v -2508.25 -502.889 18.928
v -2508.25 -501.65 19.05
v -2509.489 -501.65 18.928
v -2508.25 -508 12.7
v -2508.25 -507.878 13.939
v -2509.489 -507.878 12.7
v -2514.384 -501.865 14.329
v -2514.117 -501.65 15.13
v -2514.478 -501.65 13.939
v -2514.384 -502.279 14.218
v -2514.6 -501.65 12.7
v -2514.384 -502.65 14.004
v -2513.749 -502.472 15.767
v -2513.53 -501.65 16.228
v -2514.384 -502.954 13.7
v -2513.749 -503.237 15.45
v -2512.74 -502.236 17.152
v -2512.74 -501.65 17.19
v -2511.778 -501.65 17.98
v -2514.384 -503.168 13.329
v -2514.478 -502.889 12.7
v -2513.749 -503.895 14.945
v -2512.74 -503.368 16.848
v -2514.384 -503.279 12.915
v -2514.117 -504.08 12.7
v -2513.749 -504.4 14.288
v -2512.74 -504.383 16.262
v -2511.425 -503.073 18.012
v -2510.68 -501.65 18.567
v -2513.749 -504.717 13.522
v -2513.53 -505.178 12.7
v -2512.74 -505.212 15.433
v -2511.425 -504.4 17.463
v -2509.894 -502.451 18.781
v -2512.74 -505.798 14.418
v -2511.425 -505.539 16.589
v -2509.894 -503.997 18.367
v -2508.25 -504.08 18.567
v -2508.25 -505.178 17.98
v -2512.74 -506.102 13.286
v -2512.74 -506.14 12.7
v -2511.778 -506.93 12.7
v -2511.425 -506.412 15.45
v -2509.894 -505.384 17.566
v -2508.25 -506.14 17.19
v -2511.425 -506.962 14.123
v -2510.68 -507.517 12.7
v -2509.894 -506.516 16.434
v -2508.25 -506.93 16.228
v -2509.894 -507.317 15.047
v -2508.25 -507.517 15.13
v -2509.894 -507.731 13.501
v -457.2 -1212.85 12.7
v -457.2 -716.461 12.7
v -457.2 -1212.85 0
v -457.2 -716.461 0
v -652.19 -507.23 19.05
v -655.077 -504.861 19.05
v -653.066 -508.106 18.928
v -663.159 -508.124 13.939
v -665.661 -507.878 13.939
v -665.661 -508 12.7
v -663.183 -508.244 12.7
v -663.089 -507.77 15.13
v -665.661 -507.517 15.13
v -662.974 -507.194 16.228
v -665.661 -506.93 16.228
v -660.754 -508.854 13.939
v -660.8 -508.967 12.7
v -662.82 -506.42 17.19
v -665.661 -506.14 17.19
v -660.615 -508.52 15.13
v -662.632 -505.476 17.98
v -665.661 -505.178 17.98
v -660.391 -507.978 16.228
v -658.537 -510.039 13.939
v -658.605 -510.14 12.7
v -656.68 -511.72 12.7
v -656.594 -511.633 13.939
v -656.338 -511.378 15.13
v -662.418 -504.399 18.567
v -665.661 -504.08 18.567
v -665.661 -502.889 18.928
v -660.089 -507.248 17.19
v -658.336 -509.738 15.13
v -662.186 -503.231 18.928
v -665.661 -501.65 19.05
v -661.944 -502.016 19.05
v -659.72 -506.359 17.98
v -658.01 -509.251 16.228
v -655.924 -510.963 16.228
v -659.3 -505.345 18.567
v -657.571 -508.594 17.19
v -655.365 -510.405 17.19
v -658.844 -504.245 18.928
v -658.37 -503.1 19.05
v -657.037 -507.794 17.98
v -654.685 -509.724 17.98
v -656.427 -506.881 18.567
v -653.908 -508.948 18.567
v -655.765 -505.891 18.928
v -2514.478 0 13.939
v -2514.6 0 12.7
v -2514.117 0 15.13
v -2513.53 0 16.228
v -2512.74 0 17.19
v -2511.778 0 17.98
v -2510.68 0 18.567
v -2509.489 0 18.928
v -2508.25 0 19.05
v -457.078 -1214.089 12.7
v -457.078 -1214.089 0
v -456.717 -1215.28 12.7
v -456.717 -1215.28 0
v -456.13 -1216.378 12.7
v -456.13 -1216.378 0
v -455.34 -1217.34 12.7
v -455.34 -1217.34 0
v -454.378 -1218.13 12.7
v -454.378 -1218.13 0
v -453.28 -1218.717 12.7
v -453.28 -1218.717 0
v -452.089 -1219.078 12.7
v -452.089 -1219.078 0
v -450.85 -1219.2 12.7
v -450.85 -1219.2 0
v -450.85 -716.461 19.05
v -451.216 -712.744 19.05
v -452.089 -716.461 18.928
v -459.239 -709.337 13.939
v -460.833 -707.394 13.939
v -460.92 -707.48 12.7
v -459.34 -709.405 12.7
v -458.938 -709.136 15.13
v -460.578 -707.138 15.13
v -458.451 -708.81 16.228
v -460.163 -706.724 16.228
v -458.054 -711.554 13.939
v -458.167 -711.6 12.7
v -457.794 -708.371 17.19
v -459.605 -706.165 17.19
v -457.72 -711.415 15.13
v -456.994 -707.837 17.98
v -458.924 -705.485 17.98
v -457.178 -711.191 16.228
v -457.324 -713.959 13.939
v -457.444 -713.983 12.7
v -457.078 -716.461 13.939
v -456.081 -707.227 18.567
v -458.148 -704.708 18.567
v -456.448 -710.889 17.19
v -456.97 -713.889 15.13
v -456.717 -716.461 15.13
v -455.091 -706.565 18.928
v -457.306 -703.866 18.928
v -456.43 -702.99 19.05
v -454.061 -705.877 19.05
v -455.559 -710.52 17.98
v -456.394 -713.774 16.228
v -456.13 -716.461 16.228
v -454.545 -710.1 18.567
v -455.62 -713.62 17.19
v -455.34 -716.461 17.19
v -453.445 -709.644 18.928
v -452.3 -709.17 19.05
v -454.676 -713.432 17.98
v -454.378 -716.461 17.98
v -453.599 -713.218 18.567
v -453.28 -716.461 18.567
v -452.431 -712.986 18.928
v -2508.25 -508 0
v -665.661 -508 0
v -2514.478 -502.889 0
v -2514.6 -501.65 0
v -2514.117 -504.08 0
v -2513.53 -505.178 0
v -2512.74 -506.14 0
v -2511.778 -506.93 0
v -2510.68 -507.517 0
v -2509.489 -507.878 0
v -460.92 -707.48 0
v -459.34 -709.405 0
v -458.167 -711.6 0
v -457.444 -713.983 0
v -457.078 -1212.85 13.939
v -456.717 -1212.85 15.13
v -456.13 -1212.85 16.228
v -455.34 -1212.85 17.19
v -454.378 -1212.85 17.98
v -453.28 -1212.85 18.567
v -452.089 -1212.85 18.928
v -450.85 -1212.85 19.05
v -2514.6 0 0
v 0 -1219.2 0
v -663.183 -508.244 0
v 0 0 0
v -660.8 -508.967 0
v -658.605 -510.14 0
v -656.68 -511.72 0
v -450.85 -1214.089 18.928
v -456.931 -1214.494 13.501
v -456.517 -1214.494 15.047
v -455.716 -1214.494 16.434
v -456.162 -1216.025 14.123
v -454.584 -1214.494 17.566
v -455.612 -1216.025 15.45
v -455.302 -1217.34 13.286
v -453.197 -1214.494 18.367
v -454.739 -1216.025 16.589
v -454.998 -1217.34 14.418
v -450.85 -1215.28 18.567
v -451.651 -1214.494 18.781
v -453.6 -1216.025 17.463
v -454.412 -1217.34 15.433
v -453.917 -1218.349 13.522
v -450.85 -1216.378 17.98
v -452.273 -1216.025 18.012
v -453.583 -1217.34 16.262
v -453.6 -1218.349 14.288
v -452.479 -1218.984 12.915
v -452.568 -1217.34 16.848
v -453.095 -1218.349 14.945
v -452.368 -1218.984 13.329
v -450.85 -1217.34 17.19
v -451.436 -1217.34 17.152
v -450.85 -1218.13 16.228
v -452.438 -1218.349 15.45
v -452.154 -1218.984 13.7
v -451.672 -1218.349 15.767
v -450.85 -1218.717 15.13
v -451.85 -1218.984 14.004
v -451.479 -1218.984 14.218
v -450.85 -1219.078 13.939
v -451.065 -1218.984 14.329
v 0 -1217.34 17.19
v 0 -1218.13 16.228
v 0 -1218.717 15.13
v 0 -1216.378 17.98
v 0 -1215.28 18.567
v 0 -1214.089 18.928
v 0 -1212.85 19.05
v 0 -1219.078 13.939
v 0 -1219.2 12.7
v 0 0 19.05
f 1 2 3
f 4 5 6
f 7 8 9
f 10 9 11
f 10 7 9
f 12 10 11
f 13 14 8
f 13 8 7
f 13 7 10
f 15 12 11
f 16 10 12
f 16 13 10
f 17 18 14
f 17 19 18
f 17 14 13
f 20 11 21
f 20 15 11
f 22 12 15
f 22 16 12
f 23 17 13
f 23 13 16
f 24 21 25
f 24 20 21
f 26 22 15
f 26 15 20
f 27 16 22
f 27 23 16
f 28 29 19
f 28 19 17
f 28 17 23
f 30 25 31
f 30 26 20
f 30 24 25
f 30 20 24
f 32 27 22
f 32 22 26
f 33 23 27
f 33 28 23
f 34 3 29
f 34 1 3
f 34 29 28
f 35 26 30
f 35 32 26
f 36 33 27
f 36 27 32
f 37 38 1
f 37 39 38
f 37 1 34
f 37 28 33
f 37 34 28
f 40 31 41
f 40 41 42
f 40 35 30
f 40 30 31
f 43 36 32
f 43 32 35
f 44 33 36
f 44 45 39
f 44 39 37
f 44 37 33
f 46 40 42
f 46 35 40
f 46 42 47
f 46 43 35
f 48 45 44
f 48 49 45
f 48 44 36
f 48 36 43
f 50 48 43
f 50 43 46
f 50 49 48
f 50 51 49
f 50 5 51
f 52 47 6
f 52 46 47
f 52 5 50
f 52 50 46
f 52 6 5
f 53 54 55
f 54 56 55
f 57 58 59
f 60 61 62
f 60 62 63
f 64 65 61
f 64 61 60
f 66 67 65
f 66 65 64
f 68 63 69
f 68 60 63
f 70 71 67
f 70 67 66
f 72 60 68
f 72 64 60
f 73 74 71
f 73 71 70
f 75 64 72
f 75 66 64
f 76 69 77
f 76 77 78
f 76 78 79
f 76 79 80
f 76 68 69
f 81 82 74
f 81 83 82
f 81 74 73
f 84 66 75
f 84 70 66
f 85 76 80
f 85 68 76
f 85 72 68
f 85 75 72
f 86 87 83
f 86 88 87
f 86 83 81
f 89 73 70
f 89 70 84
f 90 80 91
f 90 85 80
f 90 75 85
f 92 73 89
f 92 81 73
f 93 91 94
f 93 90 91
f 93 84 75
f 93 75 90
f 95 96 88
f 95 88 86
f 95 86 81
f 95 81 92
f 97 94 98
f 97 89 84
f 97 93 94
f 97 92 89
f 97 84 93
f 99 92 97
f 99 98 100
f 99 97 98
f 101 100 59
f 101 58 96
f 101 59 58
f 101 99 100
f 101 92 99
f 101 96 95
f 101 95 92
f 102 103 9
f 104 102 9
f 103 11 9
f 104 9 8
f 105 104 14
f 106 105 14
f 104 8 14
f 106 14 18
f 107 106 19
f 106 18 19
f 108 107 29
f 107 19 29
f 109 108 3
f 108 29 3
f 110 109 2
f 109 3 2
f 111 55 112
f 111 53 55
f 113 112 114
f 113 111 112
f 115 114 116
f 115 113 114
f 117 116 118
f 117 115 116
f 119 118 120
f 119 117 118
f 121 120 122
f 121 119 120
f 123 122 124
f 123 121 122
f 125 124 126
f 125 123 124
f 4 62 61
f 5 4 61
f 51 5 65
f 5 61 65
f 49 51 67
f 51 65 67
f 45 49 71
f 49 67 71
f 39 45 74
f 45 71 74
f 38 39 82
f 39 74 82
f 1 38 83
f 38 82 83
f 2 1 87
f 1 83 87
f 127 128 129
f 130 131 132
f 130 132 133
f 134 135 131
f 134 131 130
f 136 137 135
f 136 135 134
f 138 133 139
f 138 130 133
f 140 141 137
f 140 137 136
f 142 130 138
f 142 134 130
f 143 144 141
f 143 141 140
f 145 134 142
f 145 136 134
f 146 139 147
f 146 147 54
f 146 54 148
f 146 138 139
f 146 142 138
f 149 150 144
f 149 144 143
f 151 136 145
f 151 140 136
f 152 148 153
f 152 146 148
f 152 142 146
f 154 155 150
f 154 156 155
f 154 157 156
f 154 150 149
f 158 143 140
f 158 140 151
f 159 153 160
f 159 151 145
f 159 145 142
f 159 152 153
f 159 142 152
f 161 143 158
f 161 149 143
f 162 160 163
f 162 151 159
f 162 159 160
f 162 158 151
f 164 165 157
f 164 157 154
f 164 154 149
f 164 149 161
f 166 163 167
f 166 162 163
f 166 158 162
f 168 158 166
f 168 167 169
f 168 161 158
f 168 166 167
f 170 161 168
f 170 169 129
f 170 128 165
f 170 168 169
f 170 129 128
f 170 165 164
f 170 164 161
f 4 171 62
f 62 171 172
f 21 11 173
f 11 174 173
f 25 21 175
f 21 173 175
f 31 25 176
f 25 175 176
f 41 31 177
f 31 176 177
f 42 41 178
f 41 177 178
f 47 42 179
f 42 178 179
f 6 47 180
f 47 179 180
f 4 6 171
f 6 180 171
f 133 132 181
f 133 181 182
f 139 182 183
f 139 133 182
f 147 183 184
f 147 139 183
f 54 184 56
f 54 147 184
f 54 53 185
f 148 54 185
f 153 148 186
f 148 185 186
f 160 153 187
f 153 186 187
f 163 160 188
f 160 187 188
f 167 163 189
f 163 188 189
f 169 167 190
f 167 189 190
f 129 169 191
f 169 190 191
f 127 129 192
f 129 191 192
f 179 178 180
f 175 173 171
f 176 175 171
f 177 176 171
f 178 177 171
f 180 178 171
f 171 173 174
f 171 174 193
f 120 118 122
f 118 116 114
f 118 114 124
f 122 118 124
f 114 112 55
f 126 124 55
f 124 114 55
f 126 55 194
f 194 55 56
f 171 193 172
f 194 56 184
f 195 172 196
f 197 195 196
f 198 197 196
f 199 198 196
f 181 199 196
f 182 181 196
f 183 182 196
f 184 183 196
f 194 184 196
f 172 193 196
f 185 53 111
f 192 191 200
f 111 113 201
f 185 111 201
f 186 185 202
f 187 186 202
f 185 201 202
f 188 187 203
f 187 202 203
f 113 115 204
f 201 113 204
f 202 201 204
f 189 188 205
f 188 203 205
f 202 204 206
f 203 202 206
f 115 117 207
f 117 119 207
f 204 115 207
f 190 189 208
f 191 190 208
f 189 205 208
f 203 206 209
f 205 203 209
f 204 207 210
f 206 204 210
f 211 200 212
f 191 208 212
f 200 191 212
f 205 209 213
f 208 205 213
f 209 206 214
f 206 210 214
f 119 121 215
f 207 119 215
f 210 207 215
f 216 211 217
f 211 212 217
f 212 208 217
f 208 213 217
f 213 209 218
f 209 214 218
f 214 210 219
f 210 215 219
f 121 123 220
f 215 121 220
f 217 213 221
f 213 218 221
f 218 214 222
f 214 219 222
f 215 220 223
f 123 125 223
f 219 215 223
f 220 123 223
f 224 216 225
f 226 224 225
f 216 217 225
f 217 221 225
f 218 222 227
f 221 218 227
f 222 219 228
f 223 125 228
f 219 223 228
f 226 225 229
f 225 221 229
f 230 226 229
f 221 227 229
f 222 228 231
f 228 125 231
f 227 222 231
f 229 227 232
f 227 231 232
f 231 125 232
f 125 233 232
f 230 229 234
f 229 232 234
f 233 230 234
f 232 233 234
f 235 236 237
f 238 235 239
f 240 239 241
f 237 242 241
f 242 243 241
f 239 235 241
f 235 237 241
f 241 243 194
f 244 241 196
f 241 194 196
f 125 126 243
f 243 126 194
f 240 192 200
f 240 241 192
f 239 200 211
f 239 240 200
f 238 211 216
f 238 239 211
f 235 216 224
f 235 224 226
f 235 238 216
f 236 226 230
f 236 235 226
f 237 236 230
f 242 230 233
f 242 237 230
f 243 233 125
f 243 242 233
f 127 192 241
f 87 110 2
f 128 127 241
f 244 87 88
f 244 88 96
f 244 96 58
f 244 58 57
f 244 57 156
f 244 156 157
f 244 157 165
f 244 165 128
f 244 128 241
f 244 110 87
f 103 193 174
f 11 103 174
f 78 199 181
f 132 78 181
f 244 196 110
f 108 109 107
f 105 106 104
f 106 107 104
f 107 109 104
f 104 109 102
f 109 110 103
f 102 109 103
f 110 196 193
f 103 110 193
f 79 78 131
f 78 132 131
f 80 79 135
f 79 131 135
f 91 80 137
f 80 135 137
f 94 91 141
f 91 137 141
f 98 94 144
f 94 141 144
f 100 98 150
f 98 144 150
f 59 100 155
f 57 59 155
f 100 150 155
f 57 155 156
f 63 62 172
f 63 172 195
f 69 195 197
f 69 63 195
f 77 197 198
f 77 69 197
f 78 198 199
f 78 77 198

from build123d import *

# Parameters (mm, degrees)
F1_DEPTH = 19.05
F2_R     = 12.7
F3_R     = 6.35
F4_R     = 6.35


with BuildPart() as f1:
    # F0 (on Top) → F1 (new body)
    with BuildSketch(Plane.XY):
        Polygon((0, -1219.2), (0, 0), (-2514.6, 0), (-2514.6, -508), (-660.4, -508), (-457.2, -711.2), (-457.2, -1219.2), align=None)
    extrude(amount=F1_DEPTH)

    # F2
    f2_edges = [f1.edges().sort_by_distance(p)[0] for p in [
        (-660.4, -508, 9.525),
        (-457.2, -711.2, 9.525),
    ]]
    fillet(f2_edges, radius=F2_R)

    # F3
    f3_edges = [f1.edges().sort_by_distance(p)[0] for p in [
        (-1590.130256, -508, 19.05),
    ]]
    fillet(f3_edges, radius=F3_R)

    # F4
    f4_edges = [f1.edges().sort_by_distance(p)[0] for p in [
        (-225.425, -1219.2, 19.05),
        (-2514.6, -250.825, 19.05),
    ]]
    fillet(f4_edges, radius=F4_R)


solid = f1.part
